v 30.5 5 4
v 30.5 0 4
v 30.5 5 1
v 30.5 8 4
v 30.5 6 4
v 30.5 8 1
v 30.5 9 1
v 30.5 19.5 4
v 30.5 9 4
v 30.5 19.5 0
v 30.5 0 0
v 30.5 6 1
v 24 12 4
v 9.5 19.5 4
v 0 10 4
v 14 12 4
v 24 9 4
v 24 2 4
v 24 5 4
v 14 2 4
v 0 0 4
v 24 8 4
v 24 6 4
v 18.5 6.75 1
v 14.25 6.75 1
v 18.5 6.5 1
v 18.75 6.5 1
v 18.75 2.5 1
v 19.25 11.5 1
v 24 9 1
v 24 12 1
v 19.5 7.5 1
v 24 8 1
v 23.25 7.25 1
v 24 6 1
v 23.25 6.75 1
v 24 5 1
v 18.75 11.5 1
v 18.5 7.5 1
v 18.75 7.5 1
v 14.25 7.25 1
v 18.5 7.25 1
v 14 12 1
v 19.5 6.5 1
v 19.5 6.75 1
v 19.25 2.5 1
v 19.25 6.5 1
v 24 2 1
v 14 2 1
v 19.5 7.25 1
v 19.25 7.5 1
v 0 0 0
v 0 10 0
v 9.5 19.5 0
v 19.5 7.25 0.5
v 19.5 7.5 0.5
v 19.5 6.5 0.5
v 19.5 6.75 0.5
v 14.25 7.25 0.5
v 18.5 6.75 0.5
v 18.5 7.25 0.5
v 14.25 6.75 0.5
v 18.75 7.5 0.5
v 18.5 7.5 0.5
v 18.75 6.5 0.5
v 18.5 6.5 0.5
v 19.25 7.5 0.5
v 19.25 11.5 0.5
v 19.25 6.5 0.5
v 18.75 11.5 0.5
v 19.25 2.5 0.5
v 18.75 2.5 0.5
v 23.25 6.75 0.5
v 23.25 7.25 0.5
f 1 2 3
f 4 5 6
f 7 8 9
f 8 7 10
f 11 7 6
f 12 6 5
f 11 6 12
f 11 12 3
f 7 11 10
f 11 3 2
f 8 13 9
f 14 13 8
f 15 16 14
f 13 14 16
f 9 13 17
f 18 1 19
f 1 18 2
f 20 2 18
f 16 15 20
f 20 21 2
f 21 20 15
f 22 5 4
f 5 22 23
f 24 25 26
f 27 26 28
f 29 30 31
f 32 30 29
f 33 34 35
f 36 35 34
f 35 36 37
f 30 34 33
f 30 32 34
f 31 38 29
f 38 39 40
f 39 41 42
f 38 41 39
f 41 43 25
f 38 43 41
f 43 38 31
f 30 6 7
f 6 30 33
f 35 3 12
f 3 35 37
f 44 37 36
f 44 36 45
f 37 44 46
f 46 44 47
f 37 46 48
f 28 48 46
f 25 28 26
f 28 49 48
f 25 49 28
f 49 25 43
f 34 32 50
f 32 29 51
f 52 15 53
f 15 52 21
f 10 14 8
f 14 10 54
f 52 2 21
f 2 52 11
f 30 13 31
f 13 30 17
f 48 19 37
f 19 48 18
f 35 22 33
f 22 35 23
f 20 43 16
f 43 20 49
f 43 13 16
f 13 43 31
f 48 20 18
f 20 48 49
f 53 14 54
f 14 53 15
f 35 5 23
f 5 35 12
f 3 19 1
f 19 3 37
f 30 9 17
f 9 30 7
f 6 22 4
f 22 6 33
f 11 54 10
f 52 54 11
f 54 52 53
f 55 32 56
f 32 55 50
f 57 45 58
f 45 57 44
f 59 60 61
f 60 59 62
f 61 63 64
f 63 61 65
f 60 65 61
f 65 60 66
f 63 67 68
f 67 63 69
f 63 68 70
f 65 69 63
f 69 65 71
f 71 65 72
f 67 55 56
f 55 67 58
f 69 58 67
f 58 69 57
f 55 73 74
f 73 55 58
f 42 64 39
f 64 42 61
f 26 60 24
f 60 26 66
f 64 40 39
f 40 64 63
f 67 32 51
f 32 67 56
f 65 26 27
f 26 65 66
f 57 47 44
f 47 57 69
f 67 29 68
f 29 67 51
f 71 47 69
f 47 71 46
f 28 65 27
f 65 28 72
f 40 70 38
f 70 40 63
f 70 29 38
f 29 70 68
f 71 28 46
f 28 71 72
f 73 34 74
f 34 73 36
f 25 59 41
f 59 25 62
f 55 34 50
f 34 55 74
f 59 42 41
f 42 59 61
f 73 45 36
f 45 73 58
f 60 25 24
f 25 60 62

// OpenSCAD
thickness = 4.0;
base = 1.0;
width = 30.5;       // increased from 28 to 30, increased to 30.5
height = 19.5;      // reduced from 20.5 to 19.5
hole_width = 10.0;      // reduced by 1mm
hole_height = 10.0;     // reduced by 1mm

pin_x = 18.5;       // translated 2mm towards flat edge, +0.5mm
pin_y = 6.5;
pin_width = 1.0;
pin_bredth = 1.0;
pin_depth = 0.5;

cut_out_y_length=9.5;
cut_out_x_length=9.5;
cut_out_NE_x_offset=0;
cut_out_NE_y_offset=height-cut_out_y_length;
cut_out_SW_x_offset=cut_out_x_length;
cut_out_SW_y_offset=height;
cut_out_SE_x_offset=0;
cut_out_SE_y_offset=height;

wire_notch_upper_N_y_offset=5;
wire_notch_lower_N_y_offset=8;
wire_notch_length=9;

cross_hair_90_degree_length=9;      // increased by 2mm
cross_hair_thickness = 0.5;

cross_hair_north_south_x_offset=pin_x+pin_width/4.0;
cross_hair_north_south_y_offset=pin_y+pin_bredth/2.0-cross_hair_90_degree_length/2.0;
cross_hair_east_west_x_offset=cross_hair_north_south_x_offset-cross_hair_90_degree_length/2.0;
cross_hair_east_west_y_offset=cross_hair_north_south_y_offset-pin_bredth/4.0+cross_hair_90_degree_length/2.0;

translate([0,0,1])

    difference()
    {
        cube([width,height,thickness-base]);

        translate ([14,2,0])        // translated hole extra 2mm towards flat edge, +1mm from 13 to 14
            cube([hole_width,hole_height,thickness-base]);

        linear_extrude(height = thickness, center = false)        
            translate([0,0,thickness])
                polygon(points=[[cut_out_NE_x_offset,cut_out_NE_y_offset],[cut_out_SW_x_offset,cut_out_SW_y_offset],[cut_out_SE_x_offset,cut_out_SE_y_offset]]);

        translate ([22.5,wire_notch_upper_N_y_offset,0])
            cube([wire_notch_length,1,thickness]);

        translate ([22.5,wire_notch_lower_N_y_offset,0])
            cube([wire_notch_length,1,thickness]);

    }

    difference()
    {
        cube([width,height,base]);

        translate ([pin_x,pin_y,base-pin_depth])
            cube([pin_width,pin_bredth,pin_depth]);

        translate ([cross_hair_north_south_x_offset,cross_hair_north_south_y_offset,base-pin_depth])
            cube([cross_hair_thickness,cross_hair_90_degree_length,thickness-base]);

        translate ([cross_hair_east_west_x_offset,cross_hair_east_west_y_offset,base-pin_depth])
            cube([cross_hair_90_degree_length,cross_hair_thickness, thickness-base]);

        linear_extrude(height = thickness, center = false)
            translate([0,0,thickness])
                polygon(points=[[cut_out_NE_x_offset,cut_out_NE_y_offset],[cut_out_SW_x_offset,cut_out_SW_y_offset],[cut_out_SE_x_offset,cut_out_SE_y_offset]]);
    }
    
